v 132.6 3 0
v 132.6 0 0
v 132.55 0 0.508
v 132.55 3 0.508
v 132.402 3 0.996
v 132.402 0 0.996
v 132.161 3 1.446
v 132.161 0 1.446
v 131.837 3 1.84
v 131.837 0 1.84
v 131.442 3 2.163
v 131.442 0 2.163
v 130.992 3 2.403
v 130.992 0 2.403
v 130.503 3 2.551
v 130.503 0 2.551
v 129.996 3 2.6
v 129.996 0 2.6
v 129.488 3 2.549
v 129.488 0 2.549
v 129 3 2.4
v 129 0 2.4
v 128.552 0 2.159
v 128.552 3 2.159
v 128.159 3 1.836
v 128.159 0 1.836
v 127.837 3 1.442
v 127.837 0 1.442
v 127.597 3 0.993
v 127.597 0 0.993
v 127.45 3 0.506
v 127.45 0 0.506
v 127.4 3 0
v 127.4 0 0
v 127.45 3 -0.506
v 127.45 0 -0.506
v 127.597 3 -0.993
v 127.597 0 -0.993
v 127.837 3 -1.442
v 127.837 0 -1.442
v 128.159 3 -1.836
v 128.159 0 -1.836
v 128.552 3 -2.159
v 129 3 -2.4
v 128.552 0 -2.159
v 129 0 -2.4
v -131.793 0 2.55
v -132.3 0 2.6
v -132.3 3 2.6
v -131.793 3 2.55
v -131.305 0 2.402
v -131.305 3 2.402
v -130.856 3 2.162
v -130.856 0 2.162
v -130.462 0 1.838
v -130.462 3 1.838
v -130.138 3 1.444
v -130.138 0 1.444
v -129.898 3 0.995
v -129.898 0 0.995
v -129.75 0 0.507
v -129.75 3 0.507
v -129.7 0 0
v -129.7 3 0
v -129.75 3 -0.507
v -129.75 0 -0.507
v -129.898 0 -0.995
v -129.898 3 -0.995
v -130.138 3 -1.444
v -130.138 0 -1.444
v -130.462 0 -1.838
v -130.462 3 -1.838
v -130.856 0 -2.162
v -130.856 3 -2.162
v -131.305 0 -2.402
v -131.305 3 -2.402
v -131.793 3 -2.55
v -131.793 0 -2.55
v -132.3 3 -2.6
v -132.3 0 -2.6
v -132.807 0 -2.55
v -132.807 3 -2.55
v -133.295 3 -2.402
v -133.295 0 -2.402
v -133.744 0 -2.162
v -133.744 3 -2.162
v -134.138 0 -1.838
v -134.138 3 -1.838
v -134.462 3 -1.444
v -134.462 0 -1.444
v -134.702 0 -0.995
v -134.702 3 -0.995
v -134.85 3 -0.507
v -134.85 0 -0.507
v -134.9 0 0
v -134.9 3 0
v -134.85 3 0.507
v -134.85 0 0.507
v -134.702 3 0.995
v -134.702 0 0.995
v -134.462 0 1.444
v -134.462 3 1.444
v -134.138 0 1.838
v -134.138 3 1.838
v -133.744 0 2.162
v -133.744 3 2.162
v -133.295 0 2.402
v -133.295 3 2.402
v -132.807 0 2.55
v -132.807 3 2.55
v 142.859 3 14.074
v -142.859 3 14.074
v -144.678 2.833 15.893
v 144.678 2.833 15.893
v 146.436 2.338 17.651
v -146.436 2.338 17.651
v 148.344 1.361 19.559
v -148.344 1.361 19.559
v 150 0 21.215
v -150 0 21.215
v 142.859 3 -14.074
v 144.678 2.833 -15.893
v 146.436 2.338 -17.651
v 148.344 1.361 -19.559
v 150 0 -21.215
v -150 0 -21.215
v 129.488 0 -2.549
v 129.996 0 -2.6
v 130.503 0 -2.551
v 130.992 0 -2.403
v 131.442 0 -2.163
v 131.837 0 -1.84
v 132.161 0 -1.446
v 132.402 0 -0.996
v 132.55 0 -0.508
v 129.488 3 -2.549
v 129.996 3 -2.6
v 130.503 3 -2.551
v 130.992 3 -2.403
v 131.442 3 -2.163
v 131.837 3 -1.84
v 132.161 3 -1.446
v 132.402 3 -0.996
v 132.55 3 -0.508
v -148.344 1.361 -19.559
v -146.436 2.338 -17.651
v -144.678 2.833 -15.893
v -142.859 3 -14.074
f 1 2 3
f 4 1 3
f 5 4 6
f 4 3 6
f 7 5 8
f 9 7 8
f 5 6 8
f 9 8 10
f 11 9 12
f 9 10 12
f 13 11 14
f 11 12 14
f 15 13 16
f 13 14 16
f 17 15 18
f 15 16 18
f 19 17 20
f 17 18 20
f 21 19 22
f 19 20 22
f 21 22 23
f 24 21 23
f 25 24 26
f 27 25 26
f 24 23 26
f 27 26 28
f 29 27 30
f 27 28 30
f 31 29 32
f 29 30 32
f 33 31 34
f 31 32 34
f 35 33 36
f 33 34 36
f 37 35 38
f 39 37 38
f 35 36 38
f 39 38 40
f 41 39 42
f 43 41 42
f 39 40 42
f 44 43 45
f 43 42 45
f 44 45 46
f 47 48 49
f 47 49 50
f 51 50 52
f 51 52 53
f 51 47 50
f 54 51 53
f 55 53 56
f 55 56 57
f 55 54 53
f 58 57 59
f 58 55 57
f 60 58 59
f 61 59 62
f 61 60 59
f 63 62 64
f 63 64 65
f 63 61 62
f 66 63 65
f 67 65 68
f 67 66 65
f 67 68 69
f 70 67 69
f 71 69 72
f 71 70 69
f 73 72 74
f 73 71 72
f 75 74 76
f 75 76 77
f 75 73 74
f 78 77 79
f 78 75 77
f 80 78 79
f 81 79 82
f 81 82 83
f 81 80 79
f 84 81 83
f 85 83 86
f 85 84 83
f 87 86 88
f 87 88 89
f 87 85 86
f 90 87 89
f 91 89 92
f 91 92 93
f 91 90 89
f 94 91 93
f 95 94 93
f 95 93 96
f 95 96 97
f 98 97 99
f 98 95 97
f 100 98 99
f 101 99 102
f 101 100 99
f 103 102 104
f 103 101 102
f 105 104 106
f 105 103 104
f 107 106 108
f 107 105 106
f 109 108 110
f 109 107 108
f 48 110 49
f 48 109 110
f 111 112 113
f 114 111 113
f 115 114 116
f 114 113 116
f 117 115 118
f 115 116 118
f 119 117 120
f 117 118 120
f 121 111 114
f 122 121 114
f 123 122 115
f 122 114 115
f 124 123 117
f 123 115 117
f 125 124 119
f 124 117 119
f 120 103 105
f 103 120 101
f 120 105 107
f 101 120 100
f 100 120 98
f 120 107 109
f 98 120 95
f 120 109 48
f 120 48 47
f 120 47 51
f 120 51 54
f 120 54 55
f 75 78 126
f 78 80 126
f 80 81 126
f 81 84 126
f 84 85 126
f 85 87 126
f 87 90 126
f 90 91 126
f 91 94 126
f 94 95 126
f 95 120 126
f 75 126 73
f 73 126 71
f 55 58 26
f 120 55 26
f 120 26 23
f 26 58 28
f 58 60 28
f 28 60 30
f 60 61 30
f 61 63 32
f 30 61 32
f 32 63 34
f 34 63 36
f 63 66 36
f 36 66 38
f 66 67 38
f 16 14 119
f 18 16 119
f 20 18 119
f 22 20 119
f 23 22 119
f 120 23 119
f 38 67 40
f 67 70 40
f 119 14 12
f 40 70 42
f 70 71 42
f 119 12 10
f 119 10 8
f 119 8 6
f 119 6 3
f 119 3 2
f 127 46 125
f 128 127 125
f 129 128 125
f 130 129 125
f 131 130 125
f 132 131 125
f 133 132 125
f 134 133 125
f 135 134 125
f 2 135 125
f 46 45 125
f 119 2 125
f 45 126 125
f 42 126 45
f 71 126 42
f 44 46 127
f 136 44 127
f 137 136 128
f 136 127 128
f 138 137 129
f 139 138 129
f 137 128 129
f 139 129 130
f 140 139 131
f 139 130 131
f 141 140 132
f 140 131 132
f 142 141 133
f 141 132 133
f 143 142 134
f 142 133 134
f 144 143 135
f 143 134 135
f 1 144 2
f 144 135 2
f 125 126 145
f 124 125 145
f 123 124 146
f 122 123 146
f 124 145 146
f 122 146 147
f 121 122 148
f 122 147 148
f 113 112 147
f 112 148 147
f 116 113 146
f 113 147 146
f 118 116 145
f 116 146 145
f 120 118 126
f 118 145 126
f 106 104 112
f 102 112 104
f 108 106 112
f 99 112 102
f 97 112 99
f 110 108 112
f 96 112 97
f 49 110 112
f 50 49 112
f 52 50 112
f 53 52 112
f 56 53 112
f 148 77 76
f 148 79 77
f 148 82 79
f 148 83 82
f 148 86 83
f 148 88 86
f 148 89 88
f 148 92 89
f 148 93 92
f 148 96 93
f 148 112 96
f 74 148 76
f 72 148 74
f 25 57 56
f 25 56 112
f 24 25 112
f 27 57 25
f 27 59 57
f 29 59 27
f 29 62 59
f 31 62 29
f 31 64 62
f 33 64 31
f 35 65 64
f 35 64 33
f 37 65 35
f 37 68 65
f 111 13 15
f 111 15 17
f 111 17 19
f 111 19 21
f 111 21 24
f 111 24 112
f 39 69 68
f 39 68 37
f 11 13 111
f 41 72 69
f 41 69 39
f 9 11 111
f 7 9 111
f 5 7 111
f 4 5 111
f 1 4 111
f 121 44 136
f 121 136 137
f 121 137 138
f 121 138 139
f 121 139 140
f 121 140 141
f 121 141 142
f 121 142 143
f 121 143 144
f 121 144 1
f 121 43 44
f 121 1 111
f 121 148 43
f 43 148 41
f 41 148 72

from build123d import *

# Parameters (mm, degrees)
SKETCH_1_W      = 21
SKETCH_1_H      = 42.43
SKETCH_1_R      = 2.6
EXTRUDE_1_DEPTH = 3
FILLET_1_R      = 10


with BuildPart() as part:
    # 草图1 → 凸台-拉伸1 (new body)
    # profile 1 of 3: a face of its own
    with BuildSketch(Plane(origin=(0, 0, 0), x_dir=(1, 0, 0), z_dir=(0, 1, 0))):
        with Locations((-139.5, 0)):
            Rectangle(SKETCH_1_W, SKETCH_1_H)
        with Locations(Location((-132.3, 0, 0), (0, 0, 270))):
            Circle(SKETCH_1_R, mode=Mode.SUBTRACT)
    # profile 2 of 3: a face of its own
    with BuildSketch(Plane(origin=(0, 0, 0), x_dir=(1, 0, 0), z_dir=(0, 1, 0))):
        with BuildLine():
            Line((129, 21.215), (-129, 21.215))
            Line((-129, 21.215), (-129, -21.215))
            Line((-129, -21.215), (129, -21.215))
            Line((129, -21.215), (129, -2.4))
            ThreePointArc((129, -2.4), (127.4, 0), (129, 2.4))
            Line((129, 2.4), (129, 21.215))
        make_face()
    # profile 3 of 3: a face of its own
    with BuildSketch(Plane(origin=(0, 0, 0), x_dir=(1, 0, 0), z_dir=(0, 1, 0))):
        with BuildLine():
            Line((150, 21.215), (129, 21.215))
            Line((129, 21.215), (129, 2.4))
            ThreePointArc((129, 2.4), (131.44222051, 2.163330765), (132.6, 0))
            ThreePointArc((132.6, 0), (131.44222051, -2.163330765), (129, -2.4))
            Line((129, -2.4), (129, -21.215))
            Line((129, -21.215), (150, -21.215))
            Line((150, -21.215), (150, 21.215))
        make_face()
    extrude(amount=EXTRUDE_1_DEPTH)

    # 圆角1
    # the kernel refuses this fillet: 10 mm, written as the material it takes off along each edge
    with BuildSketch(Plane(origin=(150, 3, 39.068571071), x_dir=(-1, 0, 0), z_dir=(0, 0, -1)), Plane(origin=(-150, 3, -39.068571071), x_dir=(1, 0, 0), z_dir=(0, 0, 1))) as fillet_1_piece_1:
        with BuildLine():
            CenterArc((7.141428429, -10), FILLET_1_R, 90, 45.572995999)
            Line((0, -3), (-0.142828569, -2.86))
            ThreePointArc((-0.142828569, -2.86), (-0.2, -1.5), (-0.2, 0))
            Line((-0.2, 0), (0, 0.2))
            Line((0, 0.2), (7.141428429, 0.2))
            Line((7.141428429, 0.2), (7.141428429, 0))
        make_face()
    extrude(amount=78.137142143, mode=Mode.SUBTRACT)
    with BuildSketch(Plane(origin=(-167.853571071, 3, 21.215), x_dir=(0, 0, -1), z_dir=(1, 0, 0))) as fillet_1_piece_2:
        with BuildLine():
            CenterArc((7.141428429, -10), FILLET_1_R, 90, 45.572995999)
            Line((0, -3), (-0.142828569, -2.86))
            ThreePointArc((-0.142828569, -2.86), (-0.2, -1.5), (-0.2, 0))
            Line((-0.2, 0), (0, 0.2))
            Line((0, 0.2), (7.141428429, 0.2))
            Line((7.141428429, 0.2), (7.141428429, 0))
        make_face()
    extrude(amount=335.707142143, mode=Mode.SUBTRACT)
    with BuildSketch(Plane(origin=(-167.853571071, 3, -21.215), x_dir=(0, -1, 0), z_dir=(1, 0, 0))) as fillet_1_piece_3:
        with BuildLine():
            CenterArc((10, -7.141428429), FILLET_1_R, 134.427004001, 45.572995999)
            Line((0, -7.141428429), (-0.2, -7.141428429))
            Line((-0.2, -7.141428429), (-0.2, 0))
            Line((-0.2, 0), (0, 0.2))
            ThreePointArc((0, 0.2), (1.5, 0.2), (2.86, 0.142828569))
            Line((2.86, 0.142828569), (3, 0))
        make_face()
    extrude(amount=335.707142143, mode=Mode.SUBTRACT)


solid = part.part
